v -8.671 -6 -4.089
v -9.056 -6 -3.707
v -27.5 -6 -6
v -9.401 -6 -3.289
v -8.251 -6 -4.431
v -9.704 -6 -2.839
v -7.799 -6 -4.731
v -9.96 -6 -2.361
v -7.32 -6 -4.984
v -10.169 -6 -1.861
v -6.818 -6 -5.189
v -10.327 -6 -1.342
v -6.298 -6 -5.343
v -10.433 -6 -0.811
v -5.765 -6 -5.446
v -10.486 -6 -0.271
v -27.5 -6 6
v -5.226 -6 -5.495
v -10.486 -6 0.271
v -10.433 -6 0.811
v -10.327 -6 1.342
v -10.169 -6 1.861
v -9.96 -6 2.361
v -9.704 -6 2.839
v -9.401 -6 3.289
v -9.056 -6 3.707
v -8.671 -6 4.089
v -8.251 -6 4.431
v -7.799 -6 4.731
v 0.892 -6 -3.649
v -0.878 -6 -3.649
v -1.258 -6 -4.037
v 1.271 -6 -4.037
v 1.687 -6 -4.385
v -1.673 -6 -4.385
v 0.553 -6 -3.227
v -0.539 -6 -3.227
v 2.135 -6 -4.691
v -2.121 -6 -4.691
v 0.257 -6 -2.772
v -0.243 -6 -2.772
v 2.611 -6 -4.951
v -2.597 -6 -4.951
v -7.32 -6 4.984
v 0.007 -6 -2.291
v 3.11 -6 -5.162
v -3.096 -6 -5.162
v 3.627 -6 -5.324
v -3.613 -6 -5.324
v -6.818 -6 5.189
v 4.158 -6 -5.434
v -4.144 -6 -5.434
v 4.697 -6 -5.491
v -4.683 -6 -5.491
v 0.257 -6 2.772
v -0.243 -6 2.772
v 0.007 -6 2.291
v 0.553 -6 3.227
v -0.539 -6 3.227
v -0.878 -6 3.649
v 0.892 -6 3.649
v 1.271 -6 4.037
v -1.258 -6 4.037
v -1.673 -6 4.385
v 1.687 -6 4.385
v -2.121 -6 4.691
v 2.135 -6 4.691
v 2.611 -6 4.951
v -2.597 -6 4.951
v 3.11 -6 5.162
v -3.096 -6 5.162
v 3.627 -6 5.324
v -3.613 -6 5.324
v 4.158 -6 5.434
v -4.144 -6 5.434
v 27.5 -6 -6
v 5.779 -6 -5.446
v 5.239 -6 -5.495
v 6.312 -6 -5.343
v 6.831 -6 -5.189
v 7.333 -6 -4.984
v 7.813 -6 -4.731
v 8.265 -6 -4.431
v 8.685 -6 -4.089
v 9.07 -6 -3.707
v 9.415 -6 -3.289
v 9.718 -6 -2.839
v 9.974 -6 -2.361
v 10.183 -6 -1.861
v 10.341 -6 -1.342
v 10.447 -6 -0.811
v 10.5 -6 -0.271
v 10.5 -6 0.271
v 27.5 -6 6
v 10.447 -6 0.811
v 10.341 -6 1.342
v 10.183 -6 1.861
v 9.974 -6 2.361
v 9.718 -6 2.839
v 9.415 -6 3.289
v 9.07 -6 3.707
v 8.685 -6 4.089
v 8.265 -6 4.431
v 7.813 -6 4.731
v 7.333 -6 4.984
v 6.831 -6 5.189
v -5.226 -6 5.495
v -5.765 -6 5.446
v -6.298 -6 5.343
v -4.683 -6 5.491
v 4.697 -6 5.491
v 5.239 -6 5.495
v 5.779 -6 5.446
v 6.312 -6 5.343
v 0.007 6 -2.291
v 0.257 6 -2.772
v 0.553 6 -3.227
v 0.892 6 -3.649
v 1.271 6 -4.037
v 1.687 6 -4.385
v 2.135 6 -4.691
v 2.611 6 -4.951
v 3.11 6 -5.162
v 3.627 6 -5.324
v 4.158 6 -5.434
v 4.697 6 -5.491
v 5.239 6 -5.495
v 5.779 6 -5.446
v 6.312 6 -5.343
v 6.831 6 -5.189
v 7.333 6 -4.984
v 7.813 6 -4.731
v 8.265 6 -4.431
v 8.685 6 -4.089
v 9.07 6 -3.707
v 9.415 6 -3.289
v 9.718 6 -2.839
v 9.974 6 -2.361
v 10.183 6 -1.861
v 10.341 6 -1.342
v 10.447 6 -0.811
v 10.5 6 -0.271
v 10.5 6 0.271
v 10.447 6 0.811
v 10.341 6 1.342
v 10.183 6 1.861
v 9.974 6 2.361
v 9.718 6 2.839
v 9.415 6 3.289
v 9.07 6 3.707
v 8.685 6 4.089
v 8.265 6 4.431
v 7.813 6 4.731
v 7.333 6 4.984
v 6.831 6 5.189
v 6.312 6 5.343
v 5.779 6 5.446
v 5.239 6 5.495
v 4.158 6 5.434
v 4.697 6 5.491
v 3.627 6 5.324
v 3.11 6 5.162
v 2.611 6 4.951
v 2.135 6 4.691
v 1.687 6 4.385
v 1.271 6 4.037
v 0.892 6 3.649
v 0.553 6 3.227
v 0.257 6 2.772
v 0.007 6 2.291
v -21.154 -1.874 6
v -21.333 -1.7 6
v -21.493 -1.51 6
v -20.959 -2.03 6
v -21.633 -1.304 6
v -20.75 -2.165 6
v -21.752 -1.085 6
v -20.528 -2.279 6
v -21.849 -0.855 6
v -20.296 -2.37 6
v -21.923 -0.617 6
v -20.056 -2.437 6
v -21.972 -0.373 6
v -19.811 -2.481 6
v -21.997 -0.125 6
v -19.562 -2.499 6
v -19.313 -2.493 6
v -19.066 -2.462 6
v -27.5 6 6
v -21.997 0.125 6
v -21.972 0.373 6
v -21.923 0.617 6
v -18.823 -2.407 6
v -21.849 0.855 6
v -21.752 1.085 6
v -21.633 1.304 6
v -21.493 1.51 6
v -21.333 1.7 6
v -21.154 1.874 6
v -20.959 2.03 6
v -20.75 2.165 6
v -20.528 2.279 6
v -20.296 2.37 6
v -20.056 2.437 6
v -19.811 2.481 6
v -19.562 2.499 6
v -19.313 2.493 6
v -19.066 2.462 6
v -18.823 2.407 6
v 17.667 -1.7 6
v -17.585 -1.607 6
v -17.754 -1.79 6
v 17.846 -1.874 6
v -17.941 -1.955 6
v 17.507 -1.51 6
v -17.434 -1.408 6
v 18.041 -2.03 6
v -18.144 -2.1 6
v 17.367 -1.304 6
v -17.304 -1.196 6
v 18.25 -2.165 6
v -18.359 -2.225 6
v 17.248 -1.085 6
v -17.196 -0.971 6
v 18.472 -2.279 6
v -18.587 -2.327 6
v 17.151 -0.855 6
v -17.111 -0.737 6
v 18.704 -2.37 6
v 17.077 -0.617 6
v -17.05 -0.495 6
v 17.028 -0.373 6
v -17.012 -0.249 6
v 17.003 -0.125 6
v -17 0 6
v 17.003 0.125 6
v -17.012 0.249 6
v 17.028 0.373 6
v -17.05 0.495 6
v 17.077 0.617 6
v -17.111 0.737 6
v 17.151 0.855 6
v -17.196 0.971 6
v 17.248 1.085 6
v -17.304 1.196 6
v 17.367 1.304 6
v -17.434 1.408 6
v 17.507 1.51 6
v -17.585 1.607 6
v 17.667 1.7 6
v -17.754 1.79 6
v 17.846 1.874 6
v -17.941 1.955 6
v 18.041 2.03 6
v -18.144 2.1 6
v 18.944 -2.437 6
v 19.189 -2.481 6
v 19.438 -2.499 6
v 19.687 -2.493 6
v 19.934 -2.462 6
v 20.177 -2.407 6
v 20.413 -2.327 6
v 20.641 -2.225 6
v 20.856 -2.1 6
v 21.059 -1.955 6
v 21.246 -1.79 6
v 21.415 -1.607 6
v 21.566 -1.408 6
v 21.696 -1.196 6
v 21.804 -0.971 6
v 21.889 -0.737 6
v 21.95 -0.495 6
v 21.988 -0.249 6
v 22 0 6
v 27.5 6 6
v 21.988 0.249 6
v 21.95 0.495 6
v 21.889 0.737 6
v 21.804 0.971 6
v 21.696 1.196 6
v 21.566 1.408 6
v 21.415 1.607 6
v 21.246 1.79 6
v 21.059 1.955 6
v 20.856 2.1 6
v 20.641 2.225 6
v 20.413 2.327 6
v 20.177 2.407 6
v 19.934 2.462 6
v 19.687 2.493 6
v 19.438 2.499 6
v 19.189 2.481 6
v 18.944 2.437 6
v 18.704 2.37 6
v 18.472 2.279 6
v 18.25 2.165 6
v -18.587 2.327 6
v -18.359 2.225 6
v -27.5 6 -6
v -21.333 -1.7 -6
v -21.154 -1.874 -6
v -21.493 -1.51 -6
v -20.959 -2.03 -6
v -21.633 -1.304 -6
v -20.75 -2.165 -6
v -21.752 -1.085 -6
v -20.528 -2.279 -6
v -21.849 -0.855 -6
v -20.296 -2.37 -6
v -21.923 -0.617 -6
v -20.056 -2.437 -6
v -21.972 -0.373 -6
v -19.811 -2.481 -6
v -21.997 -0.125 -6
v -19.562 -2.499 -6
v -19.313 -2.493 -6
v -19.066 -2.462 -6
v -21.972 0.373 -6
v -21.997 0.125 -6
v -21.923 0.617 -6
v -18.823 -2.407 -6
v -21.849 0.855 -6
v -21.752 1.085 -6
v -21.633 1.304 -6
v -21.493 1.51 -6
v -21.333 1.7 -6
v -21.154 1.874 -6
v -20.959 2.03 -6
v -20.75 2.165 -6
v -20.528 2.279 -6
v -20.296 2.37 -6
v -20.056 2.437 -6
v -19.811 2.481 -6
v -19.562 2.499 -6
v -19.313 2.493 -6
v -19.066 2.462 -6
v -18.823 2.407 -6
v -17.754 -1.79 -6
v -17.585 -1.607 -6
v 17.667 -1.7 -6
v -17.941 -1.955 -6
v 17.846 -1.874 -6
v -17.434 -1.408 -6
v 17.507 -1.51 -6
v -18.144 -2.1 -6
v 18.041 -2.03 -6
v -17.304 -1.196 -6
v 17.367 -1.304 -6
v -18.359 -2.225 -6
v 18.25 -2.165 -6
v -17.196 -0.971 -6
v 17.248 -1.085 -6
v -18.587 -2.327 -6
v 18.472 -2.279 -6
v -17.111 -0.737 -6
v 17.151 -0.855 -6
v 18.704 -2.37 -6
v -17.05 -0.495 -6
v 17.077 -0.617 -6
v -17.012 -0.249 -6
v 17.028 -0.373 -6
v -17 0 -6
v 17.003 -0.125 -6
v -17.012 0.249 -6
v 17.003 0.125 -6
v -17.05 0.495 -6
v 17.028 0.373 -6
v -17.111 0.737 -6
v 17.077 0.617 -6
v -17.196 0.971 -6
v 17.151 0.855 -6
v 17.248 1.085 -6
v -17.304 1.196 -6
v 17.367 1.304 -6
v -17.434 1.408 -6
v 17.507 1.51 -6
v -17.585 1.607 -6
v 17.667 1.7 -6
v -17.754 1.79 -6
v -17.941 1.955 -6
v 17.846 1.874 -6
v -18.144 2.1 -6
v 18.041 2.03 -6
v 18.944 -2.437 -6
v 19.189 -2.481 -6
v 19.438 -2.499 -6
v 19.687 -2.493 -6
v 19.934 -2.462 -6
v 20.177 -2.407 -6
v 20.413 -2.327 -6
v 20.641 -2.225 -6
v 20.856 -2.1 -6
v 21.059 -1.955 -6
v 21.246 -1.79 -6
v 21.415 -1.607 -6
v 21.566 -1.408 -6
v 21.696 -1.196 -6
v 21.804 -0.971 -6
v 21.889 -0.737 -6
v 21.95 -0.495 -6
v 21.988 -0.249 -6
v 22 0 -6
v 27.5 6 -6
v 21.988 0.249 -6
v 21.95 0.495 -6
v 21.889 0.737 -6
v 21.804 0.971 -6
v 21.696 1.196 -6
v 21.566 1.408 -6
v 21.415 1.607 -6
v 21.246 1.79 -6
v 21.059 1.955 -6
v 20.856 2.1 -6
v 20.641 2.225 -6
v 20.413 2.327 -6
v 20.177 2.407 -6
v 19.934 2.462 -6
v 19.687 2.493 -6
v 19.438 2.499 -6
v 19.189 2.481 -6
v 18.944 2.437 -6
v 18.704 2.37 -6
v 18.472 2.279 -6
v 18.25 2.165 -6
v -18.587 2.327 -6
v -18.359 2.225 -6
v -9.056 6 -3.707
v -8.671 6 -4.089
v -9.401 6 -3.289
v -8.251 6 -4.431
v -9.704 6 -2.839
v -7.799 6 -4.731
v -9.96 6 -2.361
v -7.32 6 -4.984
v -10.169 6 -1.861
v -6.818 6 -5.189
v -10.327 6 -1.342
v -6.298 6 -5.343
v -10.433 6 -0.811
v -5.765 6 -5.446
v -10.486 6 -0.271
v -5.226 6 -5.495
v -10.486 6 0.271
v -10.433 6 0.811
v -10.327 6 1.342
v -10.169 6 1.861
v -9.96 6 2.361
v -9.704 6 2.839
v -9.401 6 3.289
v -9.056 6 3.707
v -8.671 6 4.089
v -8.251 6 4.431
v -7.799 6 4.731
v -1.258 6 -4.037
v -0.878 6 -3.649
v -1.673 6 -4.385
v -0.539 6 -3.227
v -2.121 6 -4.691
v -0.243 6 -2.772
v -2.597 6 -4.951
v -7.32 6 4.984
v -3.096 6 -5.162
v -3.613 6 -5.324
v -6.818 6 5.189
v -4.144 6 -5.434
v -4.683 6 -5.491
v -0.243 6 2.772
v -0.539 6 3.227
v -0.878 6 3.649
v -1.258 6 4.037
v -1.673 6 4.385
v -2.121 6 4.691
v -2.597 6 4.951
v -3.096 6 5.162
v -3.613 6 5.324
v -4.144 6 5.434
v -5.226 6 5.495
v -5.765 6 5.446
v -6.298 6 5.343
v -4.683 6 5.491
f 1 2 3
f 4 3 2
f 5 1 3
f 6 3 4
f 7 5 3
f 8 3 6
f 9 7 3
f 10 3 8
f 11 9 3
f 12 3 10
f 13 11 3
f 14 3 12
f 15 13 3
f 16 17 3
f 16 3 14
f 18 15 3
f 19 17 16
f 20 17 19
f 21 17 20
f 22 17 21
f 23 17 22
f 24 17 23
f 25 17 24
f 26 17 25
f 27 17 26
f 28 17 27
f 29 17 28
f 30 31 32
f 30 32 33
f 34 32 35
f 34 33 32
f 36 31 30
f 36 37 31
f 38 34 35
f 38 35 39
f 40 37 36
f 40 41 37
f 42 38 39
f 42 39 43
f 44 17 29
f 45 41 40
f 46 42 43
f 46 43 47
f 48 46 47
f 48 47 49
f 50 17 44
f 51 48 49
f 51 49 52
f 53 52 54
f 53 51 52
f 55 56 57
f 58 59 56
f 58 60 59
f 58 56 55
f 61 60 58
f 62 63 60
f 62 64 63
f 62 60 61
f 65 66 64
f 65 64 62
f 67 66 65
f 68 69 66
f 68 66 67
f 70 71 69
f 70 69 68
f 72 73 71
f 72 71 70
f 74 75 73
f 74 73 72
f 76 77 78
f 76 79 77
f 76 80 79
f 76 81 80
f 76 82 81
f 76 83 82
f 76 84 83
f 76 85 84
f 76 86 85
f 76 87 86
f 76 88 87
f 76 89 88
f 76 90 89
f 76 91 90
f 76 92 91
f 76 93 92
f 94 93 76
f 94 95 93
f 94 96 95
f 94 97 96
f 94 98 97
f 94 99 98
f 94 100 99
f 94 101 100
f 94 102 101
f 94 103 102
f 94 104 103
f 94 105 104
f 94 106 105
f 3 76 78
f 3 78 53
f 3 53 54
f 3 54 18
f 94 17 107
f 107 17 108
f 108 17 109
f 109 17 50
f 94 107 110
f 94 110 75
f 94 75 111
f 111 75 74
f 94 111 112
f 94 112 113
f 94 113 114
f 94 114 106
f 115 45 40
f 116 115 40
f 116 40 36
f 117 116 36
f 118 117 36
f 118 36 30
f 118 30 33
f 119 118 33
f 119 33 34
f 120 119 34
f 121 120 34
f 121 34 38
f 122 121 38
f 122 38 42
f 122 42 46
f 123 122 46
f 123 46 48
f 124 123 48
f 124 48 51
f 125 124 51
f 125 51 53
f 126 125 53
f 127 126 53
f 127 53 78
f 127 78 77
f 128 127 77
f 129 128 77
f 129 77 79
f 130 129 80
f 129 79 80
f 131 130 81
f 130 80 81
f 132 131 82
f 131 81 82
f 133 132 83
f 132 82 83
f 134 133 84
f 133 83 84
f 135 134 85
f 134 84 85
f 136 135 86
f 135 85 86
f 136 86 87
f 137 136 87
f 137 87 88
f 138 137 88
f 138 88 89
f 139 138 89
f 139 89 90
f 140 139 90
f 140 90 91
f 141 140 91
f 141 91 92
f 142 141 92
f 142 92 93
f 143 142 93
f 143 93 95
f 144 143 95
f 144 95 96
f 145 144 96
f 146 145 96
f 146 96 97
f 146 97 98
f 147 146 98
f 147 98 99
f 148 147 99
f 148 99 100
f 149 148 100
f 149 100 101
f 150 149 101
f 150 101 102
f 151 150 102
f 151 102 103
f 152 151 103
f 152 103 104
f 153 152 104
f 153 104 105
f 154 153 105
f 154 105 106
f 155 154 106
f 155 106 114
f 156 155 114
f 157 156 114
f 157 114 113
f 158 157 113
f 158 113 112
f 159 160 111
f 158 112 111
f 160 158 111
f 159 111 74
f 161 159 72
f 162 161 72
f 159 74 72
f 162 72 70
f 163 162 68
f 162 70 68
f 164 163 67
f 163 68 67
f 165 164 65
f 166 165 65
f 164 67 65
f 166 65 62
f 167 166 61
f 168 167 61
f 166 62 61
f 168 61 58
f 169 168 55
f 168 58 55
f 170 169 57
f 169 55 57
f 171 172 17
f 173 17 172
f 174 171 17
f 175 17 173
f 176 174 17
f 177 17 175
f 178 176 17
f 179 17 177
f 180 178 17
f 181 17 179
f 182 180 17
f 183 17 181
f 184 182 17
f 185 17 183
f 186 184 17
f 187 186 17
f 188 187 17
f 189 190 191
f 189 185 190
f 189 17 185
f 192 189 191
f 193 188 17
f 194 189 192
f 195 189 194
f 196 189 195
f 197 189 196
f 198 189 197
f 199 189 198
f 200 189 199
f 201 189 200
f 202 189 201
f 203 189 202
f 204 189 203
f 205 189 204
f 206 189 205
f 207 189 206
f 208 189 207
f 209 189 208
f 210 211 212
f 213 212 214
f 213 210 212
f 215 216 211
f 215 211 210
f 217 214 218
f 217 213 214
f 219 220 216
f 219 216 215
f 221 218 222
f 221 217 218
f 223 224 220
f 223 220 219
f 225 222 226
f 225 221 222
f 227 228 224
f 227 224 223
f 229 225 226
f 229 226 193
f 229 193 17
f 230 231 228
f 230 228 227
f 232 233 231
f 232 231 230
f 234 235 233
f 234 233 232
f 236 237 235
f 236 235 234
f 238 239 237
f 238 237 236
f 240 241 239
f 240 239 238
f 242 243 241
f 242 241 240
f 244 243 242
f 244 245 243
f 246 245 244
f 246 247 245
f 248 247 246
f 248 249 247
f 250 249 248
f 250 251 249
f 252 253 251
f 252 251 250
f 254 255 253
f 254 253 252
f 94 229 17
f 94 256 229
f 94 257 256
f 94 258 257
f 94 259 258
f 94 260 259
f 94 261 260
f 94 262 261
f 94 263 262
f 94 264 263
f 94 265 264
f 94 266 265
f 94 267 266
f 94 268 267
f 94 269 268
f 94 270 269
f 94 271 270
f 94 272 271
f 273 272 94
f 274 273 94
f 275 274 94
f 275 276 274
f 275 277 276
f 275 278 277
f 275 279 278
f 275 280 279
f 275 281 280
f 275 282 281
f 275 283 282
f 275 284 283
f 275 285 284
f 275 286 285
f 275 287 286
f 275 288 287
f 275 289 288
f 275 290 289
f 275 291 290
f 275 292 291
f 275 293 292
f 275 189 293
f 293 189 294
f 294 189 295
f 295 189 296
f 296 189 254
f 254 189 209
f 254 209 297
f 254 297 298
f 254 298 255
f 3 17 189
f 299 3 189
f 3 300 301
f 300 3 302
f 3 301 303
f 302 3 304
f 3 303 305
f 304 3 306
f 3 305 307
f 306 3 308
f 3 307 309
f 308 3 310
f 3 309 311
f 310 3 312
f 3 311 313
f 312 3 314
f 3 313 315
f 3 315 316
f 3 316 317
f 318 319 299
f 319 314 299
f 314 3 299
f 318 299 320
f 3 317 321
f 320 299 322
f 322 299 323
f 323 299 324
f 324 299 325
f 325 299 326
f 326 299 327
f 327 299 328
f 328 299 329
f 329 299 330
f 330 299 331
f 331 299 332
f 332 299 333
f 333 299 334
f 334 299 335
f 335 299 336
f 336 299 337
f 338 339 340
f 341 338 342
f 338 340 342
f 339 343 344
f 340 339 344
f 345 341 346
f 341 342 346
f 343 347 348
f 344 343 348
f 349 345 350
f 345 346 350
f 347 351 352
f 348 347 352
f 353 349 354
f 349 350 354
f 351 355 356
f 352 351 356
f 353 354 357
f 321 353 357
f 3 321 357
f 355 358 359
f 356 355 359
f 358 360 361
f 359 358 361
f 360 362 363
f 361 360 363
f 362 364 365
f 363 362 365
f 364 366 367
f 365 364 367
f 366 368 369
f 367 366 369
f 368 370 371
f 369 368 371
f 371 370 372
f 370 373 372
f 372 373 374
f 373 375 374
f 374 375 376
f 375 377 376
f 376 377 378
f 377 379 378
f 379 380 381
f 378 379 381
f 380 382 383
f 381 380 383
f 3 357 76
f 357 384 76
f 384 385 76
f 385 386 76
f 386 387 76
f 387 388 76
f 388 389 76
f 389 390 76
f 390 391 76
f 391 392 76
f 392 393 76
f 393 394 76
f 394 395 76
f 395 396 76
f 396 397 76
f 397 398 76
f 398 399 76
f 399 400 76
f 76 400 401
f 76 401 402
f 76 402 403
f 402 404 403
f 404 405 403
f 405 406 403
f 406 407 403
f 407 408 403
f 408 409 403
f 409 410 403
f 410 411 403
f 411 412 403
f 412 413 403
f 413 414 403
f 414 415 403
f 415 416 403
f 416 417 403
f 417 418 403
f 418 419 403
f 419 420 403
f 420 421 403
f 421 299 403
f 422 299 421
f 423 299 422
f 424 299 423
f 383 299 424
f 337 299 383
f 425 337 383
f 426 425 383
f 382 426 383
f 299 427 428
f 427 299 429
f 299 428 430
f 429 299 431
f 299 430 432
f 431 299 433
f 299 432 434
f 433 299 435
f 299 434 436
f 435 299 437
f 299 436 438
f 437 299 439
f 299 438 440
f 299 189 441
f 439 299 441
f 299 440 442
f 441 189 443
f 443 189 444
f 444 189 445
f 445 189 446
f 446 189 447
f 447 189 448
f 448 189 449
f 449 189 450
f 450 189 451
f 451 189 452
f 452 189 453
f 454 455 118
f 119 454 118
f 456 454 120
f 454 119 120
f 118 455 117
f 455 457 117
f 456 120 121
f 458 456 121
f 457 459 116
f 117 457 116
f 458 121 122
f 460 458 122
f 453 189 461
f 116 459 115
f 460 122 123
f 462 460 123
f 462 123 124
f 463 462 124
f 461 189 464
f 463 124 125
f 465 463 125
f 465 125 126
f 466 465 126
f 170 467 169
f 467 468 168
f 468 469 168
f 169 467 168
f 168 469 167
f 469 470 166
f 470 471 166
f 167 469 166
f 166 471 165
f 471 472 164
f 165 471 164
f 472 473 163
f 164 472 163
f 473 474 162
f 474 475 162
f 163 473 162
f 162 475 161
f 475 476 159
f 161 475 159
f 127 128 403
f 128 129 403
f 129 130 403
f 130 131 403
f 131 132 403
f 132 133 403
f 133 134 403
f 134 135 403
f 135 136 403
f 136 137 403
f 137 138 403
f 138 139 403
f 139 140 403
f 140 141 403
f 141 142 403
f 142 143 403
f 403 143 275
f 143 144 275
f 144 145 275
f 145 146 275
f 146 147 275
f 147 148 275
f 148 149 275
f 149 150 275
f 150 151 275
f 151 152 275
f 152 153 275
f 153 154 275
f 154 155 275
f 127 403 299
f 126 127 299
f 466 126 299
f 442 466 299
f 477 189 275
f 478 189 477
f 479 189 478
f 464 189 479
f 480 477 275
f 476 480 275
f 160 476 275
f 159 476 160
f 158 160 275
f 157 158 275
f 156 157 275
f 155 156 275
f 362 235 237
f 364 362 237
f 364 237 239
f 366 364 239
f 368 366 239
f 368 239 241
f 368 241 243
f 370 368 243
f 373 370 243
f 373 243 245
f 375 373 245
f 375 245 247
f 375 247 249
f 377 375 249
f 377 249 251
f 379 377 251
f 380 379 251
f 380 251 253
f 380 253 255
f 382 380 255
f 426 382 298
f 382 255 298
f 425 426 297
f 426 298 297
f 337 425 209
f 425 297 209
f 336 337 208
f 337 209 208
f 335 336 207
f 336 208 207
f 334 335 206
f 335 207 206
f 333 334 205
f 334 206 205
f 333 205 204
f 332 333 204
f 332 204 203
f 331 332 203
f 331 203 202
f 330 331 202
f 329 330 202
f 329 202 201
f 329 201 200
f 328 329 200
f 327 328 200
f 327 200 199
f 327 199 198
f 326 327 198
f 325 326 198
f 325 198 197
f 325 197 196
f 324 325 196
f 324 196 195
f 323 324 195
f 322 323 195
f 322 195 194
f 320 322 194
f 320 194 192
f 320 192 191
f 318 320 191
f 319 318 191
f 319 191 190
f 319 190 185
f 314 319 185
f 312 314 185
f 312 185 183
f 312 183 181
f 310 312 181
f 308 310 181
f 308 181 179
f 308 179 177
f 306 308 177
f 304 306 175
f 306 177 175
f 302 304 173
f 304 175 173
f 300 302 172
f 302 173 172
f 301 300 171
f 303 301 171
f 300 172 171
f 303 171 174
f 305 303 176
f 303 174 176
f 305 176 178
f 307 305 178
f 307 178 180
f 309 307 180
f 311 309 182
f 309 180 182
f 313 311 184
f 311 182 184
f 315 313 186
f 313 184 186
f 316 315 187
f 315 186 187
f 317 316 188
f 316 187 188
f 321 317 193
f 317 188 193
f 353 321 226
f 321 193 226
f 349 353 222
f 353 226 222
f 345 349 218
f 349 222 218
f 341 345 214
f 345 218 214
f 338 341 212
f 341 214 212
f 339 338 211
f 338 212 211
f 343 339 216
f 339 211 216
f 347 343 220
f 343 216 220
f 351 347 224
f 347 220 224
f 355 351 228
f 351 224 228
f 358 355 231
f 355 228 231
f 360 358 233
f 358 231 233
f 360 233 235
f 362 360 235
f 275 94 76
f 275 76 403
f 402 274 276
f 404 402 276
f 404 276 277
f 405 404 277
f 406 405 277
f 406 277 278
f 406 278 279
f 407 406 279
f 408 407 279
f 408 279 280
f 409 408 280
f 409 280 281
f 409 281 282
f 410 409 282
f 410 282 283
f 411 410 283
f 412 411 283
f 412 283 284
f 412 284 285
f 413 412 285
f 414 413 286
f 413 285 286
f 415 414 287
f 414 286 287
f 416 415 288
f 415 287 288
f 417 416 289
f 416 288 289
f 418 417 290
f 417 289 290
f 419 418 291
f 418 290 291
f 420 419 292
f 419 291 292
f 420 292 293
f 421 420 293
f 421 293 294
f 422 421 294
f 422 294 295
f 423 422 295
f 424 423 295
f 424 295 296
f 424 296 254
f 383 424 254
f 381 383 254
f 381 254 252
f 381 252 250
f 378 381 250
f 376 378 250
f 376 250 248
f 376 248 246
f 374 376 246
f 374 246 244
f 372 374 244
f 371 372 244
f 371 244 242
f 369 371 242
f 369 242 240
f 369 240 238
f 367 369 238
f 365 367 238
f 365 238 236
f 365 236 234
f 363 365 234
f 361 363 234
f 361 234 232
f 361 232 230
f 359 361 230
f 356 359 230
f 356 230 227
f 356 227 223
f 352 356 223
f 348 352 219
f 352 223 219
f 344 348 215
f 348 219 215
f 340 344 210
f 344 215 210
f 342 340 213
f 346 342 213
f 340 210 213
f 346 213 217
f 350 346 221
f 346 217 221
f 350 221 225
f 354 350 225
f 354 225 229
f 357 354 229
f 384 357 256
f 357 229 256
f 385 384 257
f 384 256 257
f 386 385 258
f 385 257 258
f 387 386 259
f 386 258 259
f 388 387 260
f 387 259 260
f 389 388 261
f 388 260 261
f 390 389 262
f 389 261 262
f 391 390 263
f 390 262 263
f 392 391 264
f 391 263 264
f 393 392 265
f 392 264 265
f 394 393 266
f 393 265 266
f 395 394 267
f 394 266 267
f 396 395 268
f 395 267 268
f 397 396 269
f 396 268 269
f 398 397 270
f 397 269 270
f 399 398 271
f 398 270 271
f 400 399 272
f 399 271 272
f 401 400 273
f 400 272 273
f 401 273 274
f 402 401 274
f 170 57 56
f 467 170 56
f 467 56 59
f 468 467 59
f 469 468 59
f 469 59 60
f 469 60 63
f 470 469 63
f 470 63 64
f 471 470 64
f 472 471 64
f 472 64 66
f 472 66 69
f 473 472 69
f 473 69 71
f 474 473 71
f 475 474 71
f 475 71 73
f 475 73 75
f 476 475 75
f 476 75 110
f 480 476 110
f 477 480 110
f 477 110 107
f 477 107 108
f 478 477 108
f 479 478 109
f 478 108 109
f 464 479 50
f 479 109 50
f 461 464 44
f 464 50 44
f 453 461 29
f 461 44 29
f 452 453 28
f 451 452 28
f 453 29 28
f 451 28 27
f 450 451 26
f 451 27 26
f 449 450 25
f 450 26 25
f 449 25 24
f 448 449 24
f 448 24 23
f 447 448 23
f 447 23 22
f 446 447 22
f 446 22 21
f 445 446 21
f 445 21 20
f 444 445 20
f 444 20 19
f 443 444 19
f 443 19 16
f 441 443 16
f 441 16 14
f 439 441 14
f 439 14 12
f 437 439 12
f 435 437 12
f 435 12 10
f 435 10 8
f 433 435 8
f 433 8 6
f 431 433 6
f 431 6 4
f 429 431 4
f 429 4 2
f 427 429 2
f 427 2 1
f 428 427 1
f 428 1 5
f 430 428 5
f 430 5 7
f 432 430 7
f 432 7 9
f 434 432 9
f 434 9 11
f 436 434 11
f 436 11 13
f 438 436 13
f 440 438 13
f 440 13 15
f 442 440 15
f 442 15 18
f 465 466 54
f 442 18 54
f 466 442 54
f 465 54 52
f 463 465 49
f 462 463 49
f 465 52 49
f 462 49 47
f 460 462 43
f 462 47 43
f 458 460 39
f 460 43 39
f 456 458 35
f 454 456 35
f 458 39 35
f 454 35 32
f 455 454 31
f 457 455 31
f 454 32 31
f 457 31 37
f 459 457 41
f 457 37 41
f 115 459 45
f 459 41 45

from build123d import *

# Parameters (mm, degrees)
F0_W     = 55
F0_H     = 12
F1_DEPTH = 6
F2_R     = 2.5
F3_DEPTH = 12.001
F5_DEPTH = 25


with BuildPart() as f1:
    # F0 (on Top) → F1 (new body, symmetric)
    with BuildSketch(Plane.XY):
        Rectangle(F0_W, F0_H)
    extrude(amount=F1_DEPTH, both=True)

    # F2 (on face) → F3 (cut, through all)
    with BuildSketch(Plane.XY.offset(6)):
        with Locations((-19.5, 0)):
            Circle(F2_R)
        with Locations((19.5, 0)):
            Circle(F2_R)
    extrude(amount=-F3_DEPTH, mode=Mode.SUBTRACT)

    # F4 (on face) → F5 (cut)
    with BuildSketch(Plane.XZ.offset(6)):
        with BuildLine():
            ThreePointArc((0.006891, 2.291288), (-10.493109, 0), (0.006891, -2.291288))
            ThreePointArc((0.006891, -2.291288), (10.506891, 0), (0.006891, 2.291288))
        make_face()
    extrude(amount=-F5_DEPTH, mode=Mode.SUBTRACT)


solid = f1.part
